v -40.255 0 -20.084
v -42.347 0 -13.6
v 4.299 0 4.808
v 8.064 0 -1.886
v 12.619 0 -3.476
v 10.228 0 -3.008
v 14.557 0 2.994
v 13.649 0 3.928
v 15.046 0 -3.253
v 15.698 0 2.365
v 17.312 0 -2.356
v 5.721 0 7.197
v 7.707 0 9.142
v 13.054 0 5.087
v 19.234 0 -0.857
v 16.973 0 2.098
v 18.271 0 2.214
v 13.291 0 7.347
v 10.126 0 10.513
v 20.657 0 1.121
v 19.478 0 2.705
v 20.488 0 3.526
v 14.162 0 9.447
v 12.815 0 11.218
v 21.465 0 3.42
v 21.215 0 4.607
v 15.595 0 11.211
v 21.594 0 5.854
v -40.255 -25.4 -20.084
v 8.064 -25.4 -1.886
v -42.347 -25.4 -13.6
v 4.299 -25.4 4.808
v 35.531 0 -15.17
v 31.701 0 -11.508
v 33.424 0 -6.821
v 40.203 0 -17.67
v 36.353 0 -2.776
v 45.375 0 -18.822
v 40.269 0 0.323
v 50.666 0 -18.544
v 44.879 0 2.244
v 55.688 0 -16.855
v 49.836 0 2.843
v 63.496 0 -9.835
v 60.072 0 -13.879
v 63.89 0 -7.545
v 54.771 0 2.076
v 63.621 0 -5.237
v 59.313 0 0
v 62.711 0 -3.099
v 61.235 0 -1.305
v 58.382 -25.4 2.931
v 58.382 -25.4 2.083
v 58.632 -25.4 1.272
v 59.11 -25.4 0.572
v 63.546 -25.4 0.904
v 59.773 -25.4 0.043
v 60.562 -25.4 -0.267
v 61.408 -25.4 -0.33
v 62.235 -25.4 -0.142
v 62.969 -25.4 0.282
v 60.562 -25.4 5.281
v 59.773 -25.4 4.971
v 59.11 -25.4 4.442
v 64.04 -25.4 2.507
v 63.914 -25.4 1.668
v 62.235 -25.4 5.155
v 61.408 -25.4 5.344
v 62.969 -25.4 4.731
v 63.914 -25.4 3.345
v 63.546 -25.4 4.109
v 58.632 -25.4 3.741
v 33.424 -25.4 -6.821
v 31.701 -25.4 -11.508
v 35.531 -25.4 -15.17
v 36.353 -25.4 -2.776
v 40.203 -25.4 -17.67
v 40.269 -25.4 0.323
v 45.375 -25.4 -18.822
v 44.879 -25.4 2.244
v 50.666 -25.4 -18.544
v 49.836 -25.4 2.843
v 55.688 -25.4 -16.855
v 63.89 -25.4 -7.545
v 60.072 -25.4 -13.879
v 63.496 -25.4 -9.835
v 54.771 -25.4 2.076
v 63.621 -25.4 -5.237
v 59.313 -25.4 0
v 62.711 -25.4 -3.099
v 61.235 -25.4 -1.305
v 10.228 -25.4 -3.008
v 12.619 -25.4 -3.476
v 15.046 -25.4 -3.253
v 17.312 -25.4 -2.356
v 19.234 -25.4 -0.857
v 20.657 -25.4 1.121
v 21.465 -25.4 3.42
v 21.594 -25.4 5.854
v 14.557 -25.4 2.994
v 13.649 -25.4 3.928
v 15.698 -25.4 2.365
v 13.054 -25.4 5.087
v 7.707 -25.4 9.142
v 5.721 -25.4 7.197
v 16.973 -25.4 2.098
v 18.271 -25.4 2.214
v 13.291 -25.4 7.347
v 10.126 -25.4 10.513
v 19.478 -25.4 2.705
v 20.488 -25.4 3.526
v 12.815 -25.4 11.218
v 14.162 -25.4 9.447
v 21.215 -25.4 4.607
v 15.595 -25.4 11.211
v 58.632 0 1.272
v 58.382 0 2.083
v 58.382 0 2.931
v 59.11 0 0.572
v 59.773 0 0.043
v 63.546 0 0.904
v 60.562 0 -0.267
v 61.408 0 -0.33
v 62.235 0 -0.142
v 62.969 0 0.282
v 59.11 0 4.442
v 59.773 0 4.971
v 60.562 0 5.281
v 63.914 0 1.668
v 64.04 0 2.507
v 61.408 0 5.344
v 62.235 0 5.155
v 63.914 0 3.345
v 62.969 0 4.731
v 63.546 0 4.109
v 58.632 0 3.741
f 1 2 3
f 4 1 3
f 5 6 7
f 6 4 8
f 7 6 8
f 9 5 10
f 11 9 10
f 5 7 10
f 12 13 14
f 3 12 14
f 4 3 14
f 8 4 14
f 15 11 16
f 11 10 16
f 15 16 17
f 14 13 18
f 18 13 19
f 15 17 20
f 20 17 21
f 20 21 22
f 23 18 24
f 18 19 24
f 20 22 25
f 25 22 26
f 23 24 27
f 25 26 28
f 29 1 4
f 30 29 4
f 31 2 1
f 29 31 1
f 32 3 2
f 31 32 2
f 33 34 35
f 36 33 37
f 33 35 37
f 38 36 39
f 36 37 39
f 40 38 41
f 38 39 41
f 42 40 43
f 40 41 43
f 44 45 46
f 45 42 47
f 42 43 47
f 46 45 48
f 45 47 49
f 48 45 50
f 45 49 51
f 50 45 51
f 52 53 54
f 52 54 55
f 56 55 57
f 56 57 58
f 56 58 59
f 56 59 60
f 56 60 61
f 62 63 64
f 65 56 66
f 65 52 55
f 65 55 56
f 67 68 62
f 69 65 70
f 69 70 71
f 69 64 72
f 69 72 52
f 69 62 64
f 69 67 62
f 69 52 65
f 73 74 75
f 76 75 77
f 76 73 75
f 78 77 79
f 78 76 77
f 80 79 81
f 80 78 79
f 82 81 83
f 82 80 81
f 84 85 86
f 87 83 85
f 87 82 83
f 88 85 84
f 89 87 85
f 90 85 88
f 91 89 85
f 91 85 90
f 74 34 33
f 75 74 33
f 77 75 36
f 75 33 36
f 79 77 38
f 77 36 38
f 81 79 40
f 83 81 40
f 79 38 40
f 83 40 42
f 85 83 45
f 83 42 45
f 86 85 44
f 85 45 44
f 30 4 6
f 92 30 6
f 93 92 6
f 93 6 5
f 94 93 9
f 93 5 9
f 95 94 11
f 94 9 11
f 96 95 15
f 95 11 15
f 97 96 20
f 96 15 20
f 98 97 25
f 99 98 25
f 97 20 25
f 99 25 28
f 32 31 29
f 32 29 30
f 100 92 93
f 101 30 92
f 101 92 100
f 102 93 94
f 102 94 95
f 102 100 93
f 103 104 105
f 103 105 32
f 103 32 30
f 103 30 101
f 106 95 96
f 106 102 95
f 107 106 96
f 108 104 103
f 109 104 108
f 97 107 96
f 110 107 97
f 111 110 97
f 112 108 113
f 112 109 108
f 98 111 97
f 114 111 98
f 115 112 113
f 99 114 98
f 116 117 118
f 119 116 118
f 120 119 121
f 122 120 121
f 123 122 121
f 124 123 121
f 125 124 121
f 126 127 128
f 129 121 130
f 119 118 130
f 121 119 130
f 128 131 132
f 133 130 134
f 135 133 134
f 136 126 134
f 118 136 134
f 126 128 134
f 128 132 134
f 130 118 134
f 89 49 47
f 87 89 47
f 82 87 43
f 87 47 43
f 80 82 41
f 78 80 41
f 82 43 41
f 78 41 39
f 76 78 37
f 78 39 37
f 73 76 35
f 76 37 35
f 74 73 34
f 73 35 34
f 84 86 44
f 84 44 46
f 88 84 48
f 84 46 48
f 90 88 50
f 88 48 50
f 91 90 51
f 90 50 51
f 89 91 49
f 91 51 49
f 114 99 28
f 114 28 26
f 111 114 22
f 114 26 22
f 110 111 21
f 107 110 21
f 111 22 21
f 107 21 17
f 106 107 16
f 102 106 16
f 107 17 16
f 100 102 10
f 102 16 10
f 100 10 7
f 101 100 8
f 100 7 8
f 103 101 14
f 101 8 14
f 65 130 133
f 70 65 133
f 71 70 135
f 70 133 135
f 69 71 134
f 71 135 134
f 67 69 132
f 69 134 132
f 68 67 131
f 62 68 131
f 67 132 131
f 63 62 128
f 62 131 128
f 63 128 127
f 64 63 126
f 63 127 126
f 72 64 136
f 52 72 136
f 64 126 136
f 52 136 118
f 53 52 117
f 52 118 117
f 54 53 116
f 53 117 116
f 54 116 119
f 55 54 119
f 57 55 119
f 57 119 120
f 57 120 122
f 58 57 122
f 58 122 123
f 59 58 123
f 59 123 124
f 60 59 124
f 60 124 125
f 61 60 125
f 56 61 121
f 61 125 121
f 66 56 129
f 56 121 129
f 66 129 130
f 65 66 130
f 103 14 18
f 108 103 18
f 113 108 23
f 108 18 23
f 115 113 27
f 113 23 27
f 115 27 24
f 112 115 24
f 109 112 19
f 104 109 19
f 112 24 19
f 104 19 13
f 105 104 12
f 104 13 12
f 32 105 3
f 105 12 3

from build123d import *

# Parameters (mm, degrees)
F0_R     = 2.845108
F1_DEPTH = 25.4


with BuildPart() as f1:
    # F0 (on Front) → F1 (new body)
    with BuildSketch(Plane.XZ):
        with BuildLine():
            ThreePointArc((59.312634, 0), (42.507878, 1.441697), (31.701341, -11.508094))
            ThreePointArc((31.701341, -11.508094), (48.029903, -18.863164), (63.496172, -9.834683))
            ThreePointArc((63.496172, -9.834683), (63.242392, -4.135486), (59.312634, 0))
        make_face()
        with Locations((61.195228, 2.506729)):
            Circle(F0_R)
        with BuildLine():
            Line((-42.347129, -13.599859), (-40.255364, -20.084329))
            Line((-40.255364, -20.084329), (8.064403, -1.885976))
            ThreePointArc((8.064403, -1.885976), (17.311801, -2.355844), (21.594434, 5.853553))
            ThreePointArc((21.594434, 5.853553), (17.626235, 2.107666), (13.054338, 5.086934))
            ThreePointArc((13.054338, 5.086934), (13.650586, 8.428471), (15.594754, 11.210842))
            ThreePointArc((15.594754, 11.210842), (8.871842, 9.905873), (4.299225, 4.807671))
            Line((4.299225, 4.807671), (-42.347129, -13.599859))
        make_face()
    extrude(amount=F1_DEPTH)


solid = f1.part
